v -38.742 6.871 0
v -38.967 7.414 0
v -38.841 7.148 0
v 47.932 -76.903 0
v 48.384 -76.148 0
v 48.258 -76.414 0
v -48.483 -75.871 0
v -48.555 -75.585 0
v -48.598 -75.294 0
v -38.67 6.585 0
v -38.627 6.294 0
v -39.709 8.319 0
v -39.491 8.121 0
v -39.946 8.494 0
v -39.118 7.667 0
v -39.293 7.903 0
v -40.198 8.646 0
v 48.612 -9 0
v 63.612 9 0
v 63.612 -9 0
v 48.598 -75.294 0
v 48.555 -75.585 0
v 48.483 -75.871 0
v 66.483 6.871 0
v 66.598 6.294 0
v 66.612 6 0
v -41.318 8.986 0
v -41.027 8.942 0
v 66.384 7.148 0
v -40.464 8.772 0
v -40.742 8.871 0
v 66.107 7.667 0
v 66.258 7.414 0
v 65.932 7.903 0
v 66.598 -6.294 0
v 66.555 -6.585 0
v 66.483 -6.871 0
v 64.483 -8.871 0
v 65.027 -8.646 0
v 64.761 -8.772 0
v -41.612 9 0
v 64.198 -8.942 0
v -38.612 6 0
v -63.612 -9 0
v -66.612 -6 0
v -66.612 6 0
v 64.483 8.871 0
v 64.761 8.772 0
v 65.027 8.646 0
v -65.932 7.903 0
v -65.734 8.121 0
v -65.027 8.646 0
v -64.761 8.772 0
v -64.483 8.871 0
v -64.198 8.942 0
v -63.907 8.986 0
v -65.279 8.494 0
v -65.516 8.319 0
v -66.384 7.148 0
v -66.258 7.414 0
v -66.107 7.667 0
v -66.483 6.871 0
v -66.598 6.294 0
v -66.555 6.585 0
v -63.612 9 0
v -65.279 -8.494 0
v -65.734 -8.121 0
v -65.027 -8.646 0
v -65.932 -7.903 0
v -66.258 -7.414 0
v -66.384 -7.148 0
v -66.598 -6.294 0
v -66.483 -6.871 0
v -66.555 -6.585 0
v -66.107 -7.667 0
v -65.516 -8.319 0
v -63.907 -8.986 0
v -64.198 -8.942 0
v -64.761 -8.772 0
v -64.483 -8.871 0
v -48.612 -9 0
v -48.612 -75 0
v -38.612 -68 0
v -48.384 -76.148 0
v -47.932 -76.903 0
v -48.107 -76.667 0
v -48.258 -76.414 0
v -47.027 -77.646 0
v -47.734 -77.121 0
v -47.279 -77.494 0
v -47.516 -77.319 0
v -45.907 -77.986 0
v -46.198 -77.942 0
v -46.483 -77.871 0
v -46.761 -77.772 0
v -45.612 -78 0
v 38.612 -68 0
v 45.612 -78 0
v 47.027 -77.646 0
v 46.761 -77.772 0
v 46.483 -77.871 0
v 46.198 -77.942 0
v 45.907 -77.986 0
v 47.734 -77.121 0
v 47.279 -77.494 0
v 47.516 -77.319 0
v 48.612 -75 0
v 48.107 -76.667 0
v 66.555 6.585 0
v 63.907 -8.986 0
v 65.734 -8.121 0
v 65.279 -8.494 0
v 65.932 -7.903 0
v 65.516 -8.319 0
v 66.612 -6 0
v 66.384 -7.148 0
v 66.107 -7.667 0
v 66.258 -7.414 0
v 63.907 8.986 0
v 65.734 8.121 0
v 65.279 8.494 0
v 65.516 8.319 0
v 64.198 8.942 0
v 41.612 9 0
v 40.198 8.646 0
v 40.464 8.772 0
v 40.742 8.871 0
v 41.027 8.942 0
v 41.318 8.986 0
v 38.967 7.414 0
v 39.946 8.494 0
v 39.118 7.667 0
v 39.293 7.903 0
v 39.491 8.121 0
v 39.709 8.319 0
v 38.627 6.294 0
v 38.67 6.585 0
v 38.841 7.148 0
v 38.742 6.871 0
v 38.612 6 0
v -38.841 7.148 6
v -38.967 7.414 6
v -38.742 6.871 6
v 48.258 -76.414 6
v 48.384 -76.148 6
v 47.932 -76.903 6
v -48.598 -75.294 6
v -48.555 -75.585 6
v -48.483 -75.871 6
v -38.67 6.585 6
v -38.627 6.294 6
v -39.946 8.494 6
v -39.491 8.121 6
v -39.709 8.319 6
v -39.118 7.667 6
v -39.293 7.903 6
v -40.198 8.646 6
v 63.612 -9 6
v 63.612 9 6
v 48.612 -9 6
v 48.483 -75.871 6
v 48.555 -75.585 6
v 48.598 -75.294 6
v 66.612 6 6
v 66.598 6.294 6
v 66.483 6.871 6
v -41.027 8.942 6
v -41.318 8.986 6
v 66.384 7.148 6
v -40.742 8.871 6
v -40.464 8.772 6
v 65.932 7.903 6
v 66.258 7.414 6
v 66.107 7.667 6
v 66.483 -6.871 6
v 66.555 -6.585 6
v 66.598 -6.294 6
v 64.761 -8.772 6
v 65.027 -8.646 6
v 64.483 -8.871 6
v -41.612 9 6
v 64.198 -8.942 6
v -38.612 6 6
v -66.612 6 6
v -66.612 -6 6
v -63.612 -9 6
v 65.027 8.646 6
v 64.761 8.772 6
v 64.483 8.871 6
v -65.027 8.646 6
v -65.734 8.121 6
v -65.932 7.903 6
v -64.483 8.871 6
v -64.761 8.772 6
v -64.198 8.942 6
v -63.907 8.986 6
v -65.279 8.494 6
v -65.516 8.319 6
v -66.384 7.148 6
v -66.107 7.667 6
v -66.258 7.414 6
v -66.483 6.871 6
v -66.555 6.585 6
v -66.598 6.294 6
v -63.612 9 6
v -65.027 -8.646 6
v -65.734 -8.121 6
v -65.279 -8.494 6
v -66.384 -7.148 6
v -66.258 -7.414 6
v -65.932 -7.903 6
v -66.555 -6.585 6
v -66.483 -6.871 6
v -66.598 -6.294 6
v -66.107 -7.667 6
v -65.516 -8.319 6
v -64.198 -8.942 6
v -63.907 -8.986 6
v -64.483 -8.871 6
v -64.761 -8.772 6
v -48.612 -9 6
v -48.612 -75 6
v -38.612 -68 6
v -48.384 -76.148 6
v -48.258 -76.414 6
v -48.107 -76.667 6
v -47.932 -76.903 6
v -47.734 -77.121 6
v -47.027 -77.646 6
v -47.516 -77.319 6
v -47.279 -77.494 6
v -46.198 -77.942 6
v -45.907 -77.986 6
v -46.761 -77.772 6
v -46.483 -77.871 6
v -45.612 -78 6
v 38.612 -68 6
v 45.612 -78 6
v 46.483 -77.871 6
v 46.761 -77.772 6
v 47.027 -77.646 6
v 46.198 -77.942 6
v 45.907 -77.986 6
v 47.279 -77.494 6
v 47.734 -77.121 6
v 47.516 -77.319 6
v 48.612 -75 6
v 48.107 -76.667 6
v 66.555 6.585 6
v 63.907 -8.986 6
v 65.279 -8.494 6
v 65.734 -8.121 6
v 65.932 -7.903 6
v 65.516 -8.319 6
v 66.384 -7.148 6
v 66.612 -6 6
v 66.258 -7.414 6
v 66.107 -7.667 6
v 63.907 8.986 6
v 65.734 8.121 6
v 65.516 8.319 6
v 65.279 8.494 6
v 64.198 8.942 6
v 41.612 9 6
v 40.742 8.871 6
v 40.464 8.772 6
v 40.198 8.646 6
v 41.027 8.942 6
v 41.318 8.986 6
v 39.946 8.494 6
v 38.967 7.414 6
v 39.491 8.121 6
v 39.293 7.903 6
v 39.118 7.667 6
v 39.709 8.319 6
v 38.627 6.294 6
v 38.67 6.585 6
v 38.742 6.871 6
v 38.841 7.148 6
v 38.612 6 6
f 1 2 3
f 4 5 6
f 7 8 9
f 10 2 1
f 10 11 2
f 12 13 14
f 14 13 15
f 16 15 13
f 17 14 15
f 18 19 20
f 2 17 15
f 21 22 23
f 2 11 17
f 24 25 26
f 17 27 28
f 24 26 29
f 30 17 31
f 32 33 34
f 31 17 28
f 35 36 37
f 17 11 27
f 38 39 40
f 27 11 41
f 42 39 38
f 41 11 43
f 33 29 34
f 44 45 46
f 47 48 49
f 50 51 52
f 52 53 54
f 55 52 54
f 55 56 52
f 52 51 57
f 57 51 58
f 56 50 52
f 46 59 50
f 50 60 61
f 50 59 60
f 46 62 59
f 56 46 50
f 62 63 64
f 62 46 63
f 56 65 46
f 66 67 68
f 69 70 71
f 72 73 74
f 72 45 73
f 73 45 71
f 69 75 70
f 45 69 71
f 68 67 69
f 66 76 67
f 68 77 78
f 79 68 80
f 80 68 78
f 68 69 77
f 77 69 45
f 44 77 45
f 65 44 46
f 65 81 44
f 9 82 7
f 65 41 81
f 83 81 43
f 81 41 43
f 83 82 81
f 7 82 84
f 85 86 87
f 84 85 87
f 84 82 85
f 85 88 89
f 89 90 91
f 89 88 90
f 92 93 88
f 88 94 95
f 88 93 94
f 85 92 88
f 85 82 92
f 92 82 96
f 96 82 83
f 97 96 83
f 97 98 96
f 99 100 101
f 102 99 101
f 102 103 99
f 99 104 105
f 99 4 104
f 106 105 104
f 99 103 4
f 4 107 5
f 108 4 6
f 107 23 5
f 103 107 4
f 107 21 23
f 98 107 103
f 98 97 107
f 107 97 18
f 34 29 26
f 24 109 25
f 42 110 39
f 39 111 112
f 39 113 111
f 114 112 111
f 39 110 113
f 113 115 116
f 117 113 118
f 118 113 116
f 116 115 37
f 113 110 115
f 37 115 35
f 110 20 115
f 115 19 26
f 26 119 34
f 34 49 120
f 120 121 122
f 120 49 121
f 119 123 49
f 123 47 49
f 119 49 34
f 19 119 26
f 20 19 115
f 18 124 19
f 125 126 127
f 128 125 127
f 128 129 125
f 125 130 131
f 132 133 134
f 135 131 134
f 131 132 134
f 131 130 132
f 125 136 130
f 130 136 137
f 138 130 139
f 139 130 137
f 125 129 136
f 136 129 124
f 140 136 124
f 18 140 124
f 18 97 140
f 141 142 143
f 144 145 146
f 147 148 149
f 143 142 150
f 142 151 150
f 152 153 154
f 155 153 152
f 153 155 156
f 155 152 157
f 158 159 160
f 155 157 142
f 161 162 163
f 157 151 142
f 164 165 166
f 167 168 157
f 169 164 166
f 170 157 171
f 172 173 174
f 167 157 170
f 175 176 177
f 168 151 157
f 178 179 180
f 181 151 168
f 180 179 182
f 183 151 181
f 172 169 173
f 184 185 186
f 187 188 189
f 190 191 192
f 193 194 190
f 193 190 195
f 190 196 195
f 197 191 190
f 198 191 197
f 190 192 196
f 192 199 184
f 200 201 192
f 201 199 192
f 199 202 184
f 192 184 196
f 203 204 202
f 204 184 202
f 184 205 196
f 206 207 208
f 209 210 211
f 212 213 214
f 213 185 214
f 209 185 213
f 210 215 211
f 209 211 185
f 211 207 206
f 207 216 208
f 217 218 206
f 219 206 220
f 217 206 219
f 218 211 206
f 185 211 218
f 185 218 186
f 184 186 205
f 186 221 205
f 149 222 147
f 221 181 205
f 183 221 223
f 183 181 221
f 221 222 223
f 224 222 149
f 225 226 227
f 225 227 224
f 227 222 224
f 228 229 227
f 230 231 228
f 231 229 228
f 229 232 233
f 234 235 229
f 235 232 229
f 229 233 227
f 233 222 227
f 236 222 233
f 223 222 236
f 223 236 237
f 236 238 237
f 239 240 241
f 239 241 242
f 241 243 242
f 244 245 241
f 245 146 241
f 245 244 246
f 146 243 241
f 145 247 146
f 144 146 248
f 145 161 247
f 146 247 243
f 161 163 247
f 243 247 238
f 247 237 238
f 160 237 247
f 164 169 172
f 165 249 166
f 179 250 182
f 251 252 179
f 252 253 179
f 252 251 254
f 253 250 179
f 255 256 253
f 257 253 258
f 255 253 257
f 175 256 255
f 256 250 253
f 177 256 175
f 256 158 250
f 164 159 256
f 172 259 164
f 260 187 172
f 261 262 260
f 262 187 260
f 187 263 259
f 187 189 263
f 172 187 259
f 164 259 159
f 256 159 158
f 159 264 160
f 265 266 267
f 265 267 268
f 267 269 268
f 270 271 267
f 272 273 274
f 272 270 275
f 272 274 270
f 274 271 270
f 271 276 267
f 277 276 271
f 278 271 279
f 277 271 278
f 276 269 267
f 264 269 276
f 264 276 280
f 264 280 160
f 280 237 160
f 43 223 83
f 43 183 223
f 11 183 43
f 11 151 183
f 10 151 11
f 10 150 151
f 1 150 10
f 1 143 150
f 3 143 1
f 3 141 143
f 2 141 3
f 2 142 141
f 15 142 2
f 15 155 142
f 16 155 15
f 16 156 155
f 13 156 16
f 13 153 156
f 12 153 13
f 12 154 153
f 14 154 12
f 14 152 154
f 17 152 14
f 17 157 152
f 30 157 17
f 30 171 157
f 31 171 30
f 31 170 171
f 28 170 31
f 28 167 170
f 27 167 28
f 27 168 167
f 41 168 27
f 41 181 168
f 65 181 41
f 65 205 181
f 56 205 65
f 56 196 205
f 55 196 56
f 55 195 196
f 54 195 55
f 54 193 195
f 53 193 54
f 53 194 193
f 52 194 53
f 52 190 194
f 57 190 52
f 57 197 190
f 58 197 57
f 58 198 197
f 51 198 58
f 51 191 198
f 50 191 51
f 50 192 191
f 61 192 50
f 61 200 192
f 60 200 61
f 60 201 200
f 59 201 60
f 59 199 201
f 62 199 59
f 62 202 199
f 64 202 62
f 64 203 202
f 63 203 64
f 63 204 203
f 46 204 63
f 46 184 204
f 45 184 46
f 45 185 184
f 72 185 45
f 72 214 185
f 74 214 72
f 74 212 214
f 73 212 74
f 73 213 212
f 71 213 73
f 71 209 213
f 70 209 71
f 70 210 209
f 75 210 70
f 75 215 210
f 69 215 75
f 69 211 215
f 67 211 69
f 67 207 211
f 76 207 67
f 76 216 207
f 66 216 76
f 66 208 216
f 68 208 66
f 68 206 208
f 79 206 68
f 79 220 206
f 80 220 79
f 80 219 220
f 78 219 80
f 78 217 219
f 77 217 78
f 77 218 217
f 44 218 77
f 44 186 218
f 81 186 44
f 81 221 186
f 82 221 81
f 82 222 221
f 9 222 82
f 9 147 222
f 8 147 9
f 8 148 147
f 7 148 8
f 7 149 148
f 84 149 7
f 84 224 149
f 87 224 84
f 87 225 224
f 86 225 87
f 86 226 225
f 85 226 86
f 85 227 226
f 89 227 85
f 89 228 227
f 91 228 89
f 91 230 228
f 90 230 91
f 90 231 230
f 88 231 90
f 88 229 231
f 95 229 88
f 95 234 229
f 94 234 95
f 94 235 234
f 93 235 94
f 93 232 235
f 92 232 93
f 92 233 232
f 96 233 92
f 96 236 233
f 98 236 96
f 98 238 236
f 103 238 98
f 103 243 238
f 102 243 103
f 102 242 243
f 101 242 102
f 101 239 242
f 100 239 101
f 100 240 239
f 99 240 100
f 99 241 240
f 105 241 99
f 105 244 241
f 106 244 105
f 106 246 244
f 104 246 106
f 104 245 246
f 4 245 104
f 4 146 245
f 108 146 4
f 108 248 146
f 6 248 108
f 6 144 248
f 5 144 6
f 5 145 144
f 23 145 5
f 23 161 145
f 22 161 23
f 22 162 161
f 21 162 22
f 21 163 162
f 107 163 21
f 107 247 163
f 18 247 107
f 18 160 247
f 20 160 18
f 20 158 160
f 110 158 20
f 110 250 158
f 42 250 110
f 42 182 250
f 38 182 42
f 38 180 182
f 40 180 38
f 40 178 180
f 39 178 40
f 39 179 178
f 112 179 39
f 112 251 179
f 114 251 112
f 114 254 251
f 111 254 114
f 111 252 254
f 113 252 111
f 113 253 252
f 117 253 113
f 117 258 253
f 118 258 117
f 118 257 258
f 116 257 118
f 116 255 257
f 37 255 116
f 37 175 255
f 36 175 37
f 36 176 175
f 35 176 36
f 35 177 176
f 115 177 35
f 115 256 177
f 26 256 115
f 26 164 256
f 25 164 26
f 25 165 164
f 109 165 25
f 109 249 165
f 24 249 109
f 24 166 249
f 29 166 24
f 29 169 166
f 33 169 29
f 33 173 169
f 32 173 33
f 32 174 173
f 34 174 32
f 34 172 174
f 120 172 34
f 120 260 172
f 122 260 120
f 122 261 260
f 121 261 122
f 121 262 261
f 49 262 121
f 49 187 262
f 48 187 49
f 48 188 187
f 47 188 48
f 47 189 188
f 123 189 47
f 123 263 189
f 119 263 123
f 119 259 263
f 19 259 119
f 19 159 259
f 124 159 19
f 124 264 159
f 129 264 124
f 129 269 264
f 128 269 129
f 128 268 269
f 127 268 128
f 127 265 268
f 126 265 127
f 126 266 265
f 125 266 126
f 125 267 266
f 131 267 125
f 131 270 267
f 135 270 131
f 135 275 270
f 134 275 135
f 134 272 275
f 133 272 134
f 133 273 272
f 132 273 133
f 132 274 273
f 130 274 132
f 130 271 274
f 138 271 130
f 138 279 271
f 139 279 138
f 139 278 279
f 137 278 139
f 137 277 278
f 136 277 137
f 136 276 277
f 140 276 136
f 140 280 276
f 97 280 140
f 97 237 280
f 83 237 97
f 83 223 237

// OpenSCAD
// Flowerpot support for a 3 7/8 inch hole.
// Units: millimeters. Print flat with the broad U shape on the bed.

$fn = 64;

inch = 25.4;
hole_width = 3.875 * inch;

// Body slips into the hole; wings sit on the top edge so the support cannot fall through.
fit_clearance = 1.2;
body_outer_width = hole_width - fit_clearance;
rail_width = 10;
plate_thickness = 6;
u_depth = 78;

wing_overhang = 18;
wing_depth = 18;
corner_radius = 3;

assert(body_outer_width < hole_width, "Body must be narrower than the hole.");
assert(body_outer_width + (2 * wing_overhang) > hole_width, "Wings must overhang the hole.");
assert(rail_width > (2 * corner_radius), "Rail width must fit the corner radius.");
assert(wing_depth > (2 * corner_radius), "Wing depth must fit the corner radius.");

module rounded_rect(size, radius) {
    x = size[0];
    y = size[1];

    hull() {
        translate([-(x / 2) + radius, -(y / 2) + radius]) circle(r = radius);
        translate([(x / 2) - radius, -(y / 2) + radius]) circle(r = radius);
        translate([-(x / 2) + radius, (y / 2) - radius]) circle(r = radius);
        translate([(x / 2) - radius, (y / 2) - radius]) circle(r = radius);
    }
}

module rail(center, size) {
    translate(center) rounded_rect(size, corner_radius);
}

module u_support_2d() {
    side_rail_x = (body_outer_width - rail_width) / 2;
    side_rail_center_y = -u_depth / 2;
    bottom_rail_center_y = -u_depth + (rail_width / 2);
    wing_center_x = (body_outer_width / 2) - (rail_width / 2) + (wing_overhang / 2);

    union() {
        // Left and right legs.
        rail([-side_rail_x, side_rail_center_y], [rail_width, u_depth]);
        rail([side_rail_x, side_rail_center_y], [rail_width, u_depth]);

        // Bottom bridge that catches the flowerpot base.
        rail([0, bottom_rail_center_y], [body_outer_width, rail_width]);

        // Top wings rest on the rim around the hole.
        rail([-wing_center_x, 0], [rail_width + wing_overhang, wing_depth]);
        rail([wing_center_x, 0], [rail_width + wing_overhang, wing_depth]);
    }
}

linear_extrude(height = plate_thickness, convexity = 10)
    u_support_2d();
